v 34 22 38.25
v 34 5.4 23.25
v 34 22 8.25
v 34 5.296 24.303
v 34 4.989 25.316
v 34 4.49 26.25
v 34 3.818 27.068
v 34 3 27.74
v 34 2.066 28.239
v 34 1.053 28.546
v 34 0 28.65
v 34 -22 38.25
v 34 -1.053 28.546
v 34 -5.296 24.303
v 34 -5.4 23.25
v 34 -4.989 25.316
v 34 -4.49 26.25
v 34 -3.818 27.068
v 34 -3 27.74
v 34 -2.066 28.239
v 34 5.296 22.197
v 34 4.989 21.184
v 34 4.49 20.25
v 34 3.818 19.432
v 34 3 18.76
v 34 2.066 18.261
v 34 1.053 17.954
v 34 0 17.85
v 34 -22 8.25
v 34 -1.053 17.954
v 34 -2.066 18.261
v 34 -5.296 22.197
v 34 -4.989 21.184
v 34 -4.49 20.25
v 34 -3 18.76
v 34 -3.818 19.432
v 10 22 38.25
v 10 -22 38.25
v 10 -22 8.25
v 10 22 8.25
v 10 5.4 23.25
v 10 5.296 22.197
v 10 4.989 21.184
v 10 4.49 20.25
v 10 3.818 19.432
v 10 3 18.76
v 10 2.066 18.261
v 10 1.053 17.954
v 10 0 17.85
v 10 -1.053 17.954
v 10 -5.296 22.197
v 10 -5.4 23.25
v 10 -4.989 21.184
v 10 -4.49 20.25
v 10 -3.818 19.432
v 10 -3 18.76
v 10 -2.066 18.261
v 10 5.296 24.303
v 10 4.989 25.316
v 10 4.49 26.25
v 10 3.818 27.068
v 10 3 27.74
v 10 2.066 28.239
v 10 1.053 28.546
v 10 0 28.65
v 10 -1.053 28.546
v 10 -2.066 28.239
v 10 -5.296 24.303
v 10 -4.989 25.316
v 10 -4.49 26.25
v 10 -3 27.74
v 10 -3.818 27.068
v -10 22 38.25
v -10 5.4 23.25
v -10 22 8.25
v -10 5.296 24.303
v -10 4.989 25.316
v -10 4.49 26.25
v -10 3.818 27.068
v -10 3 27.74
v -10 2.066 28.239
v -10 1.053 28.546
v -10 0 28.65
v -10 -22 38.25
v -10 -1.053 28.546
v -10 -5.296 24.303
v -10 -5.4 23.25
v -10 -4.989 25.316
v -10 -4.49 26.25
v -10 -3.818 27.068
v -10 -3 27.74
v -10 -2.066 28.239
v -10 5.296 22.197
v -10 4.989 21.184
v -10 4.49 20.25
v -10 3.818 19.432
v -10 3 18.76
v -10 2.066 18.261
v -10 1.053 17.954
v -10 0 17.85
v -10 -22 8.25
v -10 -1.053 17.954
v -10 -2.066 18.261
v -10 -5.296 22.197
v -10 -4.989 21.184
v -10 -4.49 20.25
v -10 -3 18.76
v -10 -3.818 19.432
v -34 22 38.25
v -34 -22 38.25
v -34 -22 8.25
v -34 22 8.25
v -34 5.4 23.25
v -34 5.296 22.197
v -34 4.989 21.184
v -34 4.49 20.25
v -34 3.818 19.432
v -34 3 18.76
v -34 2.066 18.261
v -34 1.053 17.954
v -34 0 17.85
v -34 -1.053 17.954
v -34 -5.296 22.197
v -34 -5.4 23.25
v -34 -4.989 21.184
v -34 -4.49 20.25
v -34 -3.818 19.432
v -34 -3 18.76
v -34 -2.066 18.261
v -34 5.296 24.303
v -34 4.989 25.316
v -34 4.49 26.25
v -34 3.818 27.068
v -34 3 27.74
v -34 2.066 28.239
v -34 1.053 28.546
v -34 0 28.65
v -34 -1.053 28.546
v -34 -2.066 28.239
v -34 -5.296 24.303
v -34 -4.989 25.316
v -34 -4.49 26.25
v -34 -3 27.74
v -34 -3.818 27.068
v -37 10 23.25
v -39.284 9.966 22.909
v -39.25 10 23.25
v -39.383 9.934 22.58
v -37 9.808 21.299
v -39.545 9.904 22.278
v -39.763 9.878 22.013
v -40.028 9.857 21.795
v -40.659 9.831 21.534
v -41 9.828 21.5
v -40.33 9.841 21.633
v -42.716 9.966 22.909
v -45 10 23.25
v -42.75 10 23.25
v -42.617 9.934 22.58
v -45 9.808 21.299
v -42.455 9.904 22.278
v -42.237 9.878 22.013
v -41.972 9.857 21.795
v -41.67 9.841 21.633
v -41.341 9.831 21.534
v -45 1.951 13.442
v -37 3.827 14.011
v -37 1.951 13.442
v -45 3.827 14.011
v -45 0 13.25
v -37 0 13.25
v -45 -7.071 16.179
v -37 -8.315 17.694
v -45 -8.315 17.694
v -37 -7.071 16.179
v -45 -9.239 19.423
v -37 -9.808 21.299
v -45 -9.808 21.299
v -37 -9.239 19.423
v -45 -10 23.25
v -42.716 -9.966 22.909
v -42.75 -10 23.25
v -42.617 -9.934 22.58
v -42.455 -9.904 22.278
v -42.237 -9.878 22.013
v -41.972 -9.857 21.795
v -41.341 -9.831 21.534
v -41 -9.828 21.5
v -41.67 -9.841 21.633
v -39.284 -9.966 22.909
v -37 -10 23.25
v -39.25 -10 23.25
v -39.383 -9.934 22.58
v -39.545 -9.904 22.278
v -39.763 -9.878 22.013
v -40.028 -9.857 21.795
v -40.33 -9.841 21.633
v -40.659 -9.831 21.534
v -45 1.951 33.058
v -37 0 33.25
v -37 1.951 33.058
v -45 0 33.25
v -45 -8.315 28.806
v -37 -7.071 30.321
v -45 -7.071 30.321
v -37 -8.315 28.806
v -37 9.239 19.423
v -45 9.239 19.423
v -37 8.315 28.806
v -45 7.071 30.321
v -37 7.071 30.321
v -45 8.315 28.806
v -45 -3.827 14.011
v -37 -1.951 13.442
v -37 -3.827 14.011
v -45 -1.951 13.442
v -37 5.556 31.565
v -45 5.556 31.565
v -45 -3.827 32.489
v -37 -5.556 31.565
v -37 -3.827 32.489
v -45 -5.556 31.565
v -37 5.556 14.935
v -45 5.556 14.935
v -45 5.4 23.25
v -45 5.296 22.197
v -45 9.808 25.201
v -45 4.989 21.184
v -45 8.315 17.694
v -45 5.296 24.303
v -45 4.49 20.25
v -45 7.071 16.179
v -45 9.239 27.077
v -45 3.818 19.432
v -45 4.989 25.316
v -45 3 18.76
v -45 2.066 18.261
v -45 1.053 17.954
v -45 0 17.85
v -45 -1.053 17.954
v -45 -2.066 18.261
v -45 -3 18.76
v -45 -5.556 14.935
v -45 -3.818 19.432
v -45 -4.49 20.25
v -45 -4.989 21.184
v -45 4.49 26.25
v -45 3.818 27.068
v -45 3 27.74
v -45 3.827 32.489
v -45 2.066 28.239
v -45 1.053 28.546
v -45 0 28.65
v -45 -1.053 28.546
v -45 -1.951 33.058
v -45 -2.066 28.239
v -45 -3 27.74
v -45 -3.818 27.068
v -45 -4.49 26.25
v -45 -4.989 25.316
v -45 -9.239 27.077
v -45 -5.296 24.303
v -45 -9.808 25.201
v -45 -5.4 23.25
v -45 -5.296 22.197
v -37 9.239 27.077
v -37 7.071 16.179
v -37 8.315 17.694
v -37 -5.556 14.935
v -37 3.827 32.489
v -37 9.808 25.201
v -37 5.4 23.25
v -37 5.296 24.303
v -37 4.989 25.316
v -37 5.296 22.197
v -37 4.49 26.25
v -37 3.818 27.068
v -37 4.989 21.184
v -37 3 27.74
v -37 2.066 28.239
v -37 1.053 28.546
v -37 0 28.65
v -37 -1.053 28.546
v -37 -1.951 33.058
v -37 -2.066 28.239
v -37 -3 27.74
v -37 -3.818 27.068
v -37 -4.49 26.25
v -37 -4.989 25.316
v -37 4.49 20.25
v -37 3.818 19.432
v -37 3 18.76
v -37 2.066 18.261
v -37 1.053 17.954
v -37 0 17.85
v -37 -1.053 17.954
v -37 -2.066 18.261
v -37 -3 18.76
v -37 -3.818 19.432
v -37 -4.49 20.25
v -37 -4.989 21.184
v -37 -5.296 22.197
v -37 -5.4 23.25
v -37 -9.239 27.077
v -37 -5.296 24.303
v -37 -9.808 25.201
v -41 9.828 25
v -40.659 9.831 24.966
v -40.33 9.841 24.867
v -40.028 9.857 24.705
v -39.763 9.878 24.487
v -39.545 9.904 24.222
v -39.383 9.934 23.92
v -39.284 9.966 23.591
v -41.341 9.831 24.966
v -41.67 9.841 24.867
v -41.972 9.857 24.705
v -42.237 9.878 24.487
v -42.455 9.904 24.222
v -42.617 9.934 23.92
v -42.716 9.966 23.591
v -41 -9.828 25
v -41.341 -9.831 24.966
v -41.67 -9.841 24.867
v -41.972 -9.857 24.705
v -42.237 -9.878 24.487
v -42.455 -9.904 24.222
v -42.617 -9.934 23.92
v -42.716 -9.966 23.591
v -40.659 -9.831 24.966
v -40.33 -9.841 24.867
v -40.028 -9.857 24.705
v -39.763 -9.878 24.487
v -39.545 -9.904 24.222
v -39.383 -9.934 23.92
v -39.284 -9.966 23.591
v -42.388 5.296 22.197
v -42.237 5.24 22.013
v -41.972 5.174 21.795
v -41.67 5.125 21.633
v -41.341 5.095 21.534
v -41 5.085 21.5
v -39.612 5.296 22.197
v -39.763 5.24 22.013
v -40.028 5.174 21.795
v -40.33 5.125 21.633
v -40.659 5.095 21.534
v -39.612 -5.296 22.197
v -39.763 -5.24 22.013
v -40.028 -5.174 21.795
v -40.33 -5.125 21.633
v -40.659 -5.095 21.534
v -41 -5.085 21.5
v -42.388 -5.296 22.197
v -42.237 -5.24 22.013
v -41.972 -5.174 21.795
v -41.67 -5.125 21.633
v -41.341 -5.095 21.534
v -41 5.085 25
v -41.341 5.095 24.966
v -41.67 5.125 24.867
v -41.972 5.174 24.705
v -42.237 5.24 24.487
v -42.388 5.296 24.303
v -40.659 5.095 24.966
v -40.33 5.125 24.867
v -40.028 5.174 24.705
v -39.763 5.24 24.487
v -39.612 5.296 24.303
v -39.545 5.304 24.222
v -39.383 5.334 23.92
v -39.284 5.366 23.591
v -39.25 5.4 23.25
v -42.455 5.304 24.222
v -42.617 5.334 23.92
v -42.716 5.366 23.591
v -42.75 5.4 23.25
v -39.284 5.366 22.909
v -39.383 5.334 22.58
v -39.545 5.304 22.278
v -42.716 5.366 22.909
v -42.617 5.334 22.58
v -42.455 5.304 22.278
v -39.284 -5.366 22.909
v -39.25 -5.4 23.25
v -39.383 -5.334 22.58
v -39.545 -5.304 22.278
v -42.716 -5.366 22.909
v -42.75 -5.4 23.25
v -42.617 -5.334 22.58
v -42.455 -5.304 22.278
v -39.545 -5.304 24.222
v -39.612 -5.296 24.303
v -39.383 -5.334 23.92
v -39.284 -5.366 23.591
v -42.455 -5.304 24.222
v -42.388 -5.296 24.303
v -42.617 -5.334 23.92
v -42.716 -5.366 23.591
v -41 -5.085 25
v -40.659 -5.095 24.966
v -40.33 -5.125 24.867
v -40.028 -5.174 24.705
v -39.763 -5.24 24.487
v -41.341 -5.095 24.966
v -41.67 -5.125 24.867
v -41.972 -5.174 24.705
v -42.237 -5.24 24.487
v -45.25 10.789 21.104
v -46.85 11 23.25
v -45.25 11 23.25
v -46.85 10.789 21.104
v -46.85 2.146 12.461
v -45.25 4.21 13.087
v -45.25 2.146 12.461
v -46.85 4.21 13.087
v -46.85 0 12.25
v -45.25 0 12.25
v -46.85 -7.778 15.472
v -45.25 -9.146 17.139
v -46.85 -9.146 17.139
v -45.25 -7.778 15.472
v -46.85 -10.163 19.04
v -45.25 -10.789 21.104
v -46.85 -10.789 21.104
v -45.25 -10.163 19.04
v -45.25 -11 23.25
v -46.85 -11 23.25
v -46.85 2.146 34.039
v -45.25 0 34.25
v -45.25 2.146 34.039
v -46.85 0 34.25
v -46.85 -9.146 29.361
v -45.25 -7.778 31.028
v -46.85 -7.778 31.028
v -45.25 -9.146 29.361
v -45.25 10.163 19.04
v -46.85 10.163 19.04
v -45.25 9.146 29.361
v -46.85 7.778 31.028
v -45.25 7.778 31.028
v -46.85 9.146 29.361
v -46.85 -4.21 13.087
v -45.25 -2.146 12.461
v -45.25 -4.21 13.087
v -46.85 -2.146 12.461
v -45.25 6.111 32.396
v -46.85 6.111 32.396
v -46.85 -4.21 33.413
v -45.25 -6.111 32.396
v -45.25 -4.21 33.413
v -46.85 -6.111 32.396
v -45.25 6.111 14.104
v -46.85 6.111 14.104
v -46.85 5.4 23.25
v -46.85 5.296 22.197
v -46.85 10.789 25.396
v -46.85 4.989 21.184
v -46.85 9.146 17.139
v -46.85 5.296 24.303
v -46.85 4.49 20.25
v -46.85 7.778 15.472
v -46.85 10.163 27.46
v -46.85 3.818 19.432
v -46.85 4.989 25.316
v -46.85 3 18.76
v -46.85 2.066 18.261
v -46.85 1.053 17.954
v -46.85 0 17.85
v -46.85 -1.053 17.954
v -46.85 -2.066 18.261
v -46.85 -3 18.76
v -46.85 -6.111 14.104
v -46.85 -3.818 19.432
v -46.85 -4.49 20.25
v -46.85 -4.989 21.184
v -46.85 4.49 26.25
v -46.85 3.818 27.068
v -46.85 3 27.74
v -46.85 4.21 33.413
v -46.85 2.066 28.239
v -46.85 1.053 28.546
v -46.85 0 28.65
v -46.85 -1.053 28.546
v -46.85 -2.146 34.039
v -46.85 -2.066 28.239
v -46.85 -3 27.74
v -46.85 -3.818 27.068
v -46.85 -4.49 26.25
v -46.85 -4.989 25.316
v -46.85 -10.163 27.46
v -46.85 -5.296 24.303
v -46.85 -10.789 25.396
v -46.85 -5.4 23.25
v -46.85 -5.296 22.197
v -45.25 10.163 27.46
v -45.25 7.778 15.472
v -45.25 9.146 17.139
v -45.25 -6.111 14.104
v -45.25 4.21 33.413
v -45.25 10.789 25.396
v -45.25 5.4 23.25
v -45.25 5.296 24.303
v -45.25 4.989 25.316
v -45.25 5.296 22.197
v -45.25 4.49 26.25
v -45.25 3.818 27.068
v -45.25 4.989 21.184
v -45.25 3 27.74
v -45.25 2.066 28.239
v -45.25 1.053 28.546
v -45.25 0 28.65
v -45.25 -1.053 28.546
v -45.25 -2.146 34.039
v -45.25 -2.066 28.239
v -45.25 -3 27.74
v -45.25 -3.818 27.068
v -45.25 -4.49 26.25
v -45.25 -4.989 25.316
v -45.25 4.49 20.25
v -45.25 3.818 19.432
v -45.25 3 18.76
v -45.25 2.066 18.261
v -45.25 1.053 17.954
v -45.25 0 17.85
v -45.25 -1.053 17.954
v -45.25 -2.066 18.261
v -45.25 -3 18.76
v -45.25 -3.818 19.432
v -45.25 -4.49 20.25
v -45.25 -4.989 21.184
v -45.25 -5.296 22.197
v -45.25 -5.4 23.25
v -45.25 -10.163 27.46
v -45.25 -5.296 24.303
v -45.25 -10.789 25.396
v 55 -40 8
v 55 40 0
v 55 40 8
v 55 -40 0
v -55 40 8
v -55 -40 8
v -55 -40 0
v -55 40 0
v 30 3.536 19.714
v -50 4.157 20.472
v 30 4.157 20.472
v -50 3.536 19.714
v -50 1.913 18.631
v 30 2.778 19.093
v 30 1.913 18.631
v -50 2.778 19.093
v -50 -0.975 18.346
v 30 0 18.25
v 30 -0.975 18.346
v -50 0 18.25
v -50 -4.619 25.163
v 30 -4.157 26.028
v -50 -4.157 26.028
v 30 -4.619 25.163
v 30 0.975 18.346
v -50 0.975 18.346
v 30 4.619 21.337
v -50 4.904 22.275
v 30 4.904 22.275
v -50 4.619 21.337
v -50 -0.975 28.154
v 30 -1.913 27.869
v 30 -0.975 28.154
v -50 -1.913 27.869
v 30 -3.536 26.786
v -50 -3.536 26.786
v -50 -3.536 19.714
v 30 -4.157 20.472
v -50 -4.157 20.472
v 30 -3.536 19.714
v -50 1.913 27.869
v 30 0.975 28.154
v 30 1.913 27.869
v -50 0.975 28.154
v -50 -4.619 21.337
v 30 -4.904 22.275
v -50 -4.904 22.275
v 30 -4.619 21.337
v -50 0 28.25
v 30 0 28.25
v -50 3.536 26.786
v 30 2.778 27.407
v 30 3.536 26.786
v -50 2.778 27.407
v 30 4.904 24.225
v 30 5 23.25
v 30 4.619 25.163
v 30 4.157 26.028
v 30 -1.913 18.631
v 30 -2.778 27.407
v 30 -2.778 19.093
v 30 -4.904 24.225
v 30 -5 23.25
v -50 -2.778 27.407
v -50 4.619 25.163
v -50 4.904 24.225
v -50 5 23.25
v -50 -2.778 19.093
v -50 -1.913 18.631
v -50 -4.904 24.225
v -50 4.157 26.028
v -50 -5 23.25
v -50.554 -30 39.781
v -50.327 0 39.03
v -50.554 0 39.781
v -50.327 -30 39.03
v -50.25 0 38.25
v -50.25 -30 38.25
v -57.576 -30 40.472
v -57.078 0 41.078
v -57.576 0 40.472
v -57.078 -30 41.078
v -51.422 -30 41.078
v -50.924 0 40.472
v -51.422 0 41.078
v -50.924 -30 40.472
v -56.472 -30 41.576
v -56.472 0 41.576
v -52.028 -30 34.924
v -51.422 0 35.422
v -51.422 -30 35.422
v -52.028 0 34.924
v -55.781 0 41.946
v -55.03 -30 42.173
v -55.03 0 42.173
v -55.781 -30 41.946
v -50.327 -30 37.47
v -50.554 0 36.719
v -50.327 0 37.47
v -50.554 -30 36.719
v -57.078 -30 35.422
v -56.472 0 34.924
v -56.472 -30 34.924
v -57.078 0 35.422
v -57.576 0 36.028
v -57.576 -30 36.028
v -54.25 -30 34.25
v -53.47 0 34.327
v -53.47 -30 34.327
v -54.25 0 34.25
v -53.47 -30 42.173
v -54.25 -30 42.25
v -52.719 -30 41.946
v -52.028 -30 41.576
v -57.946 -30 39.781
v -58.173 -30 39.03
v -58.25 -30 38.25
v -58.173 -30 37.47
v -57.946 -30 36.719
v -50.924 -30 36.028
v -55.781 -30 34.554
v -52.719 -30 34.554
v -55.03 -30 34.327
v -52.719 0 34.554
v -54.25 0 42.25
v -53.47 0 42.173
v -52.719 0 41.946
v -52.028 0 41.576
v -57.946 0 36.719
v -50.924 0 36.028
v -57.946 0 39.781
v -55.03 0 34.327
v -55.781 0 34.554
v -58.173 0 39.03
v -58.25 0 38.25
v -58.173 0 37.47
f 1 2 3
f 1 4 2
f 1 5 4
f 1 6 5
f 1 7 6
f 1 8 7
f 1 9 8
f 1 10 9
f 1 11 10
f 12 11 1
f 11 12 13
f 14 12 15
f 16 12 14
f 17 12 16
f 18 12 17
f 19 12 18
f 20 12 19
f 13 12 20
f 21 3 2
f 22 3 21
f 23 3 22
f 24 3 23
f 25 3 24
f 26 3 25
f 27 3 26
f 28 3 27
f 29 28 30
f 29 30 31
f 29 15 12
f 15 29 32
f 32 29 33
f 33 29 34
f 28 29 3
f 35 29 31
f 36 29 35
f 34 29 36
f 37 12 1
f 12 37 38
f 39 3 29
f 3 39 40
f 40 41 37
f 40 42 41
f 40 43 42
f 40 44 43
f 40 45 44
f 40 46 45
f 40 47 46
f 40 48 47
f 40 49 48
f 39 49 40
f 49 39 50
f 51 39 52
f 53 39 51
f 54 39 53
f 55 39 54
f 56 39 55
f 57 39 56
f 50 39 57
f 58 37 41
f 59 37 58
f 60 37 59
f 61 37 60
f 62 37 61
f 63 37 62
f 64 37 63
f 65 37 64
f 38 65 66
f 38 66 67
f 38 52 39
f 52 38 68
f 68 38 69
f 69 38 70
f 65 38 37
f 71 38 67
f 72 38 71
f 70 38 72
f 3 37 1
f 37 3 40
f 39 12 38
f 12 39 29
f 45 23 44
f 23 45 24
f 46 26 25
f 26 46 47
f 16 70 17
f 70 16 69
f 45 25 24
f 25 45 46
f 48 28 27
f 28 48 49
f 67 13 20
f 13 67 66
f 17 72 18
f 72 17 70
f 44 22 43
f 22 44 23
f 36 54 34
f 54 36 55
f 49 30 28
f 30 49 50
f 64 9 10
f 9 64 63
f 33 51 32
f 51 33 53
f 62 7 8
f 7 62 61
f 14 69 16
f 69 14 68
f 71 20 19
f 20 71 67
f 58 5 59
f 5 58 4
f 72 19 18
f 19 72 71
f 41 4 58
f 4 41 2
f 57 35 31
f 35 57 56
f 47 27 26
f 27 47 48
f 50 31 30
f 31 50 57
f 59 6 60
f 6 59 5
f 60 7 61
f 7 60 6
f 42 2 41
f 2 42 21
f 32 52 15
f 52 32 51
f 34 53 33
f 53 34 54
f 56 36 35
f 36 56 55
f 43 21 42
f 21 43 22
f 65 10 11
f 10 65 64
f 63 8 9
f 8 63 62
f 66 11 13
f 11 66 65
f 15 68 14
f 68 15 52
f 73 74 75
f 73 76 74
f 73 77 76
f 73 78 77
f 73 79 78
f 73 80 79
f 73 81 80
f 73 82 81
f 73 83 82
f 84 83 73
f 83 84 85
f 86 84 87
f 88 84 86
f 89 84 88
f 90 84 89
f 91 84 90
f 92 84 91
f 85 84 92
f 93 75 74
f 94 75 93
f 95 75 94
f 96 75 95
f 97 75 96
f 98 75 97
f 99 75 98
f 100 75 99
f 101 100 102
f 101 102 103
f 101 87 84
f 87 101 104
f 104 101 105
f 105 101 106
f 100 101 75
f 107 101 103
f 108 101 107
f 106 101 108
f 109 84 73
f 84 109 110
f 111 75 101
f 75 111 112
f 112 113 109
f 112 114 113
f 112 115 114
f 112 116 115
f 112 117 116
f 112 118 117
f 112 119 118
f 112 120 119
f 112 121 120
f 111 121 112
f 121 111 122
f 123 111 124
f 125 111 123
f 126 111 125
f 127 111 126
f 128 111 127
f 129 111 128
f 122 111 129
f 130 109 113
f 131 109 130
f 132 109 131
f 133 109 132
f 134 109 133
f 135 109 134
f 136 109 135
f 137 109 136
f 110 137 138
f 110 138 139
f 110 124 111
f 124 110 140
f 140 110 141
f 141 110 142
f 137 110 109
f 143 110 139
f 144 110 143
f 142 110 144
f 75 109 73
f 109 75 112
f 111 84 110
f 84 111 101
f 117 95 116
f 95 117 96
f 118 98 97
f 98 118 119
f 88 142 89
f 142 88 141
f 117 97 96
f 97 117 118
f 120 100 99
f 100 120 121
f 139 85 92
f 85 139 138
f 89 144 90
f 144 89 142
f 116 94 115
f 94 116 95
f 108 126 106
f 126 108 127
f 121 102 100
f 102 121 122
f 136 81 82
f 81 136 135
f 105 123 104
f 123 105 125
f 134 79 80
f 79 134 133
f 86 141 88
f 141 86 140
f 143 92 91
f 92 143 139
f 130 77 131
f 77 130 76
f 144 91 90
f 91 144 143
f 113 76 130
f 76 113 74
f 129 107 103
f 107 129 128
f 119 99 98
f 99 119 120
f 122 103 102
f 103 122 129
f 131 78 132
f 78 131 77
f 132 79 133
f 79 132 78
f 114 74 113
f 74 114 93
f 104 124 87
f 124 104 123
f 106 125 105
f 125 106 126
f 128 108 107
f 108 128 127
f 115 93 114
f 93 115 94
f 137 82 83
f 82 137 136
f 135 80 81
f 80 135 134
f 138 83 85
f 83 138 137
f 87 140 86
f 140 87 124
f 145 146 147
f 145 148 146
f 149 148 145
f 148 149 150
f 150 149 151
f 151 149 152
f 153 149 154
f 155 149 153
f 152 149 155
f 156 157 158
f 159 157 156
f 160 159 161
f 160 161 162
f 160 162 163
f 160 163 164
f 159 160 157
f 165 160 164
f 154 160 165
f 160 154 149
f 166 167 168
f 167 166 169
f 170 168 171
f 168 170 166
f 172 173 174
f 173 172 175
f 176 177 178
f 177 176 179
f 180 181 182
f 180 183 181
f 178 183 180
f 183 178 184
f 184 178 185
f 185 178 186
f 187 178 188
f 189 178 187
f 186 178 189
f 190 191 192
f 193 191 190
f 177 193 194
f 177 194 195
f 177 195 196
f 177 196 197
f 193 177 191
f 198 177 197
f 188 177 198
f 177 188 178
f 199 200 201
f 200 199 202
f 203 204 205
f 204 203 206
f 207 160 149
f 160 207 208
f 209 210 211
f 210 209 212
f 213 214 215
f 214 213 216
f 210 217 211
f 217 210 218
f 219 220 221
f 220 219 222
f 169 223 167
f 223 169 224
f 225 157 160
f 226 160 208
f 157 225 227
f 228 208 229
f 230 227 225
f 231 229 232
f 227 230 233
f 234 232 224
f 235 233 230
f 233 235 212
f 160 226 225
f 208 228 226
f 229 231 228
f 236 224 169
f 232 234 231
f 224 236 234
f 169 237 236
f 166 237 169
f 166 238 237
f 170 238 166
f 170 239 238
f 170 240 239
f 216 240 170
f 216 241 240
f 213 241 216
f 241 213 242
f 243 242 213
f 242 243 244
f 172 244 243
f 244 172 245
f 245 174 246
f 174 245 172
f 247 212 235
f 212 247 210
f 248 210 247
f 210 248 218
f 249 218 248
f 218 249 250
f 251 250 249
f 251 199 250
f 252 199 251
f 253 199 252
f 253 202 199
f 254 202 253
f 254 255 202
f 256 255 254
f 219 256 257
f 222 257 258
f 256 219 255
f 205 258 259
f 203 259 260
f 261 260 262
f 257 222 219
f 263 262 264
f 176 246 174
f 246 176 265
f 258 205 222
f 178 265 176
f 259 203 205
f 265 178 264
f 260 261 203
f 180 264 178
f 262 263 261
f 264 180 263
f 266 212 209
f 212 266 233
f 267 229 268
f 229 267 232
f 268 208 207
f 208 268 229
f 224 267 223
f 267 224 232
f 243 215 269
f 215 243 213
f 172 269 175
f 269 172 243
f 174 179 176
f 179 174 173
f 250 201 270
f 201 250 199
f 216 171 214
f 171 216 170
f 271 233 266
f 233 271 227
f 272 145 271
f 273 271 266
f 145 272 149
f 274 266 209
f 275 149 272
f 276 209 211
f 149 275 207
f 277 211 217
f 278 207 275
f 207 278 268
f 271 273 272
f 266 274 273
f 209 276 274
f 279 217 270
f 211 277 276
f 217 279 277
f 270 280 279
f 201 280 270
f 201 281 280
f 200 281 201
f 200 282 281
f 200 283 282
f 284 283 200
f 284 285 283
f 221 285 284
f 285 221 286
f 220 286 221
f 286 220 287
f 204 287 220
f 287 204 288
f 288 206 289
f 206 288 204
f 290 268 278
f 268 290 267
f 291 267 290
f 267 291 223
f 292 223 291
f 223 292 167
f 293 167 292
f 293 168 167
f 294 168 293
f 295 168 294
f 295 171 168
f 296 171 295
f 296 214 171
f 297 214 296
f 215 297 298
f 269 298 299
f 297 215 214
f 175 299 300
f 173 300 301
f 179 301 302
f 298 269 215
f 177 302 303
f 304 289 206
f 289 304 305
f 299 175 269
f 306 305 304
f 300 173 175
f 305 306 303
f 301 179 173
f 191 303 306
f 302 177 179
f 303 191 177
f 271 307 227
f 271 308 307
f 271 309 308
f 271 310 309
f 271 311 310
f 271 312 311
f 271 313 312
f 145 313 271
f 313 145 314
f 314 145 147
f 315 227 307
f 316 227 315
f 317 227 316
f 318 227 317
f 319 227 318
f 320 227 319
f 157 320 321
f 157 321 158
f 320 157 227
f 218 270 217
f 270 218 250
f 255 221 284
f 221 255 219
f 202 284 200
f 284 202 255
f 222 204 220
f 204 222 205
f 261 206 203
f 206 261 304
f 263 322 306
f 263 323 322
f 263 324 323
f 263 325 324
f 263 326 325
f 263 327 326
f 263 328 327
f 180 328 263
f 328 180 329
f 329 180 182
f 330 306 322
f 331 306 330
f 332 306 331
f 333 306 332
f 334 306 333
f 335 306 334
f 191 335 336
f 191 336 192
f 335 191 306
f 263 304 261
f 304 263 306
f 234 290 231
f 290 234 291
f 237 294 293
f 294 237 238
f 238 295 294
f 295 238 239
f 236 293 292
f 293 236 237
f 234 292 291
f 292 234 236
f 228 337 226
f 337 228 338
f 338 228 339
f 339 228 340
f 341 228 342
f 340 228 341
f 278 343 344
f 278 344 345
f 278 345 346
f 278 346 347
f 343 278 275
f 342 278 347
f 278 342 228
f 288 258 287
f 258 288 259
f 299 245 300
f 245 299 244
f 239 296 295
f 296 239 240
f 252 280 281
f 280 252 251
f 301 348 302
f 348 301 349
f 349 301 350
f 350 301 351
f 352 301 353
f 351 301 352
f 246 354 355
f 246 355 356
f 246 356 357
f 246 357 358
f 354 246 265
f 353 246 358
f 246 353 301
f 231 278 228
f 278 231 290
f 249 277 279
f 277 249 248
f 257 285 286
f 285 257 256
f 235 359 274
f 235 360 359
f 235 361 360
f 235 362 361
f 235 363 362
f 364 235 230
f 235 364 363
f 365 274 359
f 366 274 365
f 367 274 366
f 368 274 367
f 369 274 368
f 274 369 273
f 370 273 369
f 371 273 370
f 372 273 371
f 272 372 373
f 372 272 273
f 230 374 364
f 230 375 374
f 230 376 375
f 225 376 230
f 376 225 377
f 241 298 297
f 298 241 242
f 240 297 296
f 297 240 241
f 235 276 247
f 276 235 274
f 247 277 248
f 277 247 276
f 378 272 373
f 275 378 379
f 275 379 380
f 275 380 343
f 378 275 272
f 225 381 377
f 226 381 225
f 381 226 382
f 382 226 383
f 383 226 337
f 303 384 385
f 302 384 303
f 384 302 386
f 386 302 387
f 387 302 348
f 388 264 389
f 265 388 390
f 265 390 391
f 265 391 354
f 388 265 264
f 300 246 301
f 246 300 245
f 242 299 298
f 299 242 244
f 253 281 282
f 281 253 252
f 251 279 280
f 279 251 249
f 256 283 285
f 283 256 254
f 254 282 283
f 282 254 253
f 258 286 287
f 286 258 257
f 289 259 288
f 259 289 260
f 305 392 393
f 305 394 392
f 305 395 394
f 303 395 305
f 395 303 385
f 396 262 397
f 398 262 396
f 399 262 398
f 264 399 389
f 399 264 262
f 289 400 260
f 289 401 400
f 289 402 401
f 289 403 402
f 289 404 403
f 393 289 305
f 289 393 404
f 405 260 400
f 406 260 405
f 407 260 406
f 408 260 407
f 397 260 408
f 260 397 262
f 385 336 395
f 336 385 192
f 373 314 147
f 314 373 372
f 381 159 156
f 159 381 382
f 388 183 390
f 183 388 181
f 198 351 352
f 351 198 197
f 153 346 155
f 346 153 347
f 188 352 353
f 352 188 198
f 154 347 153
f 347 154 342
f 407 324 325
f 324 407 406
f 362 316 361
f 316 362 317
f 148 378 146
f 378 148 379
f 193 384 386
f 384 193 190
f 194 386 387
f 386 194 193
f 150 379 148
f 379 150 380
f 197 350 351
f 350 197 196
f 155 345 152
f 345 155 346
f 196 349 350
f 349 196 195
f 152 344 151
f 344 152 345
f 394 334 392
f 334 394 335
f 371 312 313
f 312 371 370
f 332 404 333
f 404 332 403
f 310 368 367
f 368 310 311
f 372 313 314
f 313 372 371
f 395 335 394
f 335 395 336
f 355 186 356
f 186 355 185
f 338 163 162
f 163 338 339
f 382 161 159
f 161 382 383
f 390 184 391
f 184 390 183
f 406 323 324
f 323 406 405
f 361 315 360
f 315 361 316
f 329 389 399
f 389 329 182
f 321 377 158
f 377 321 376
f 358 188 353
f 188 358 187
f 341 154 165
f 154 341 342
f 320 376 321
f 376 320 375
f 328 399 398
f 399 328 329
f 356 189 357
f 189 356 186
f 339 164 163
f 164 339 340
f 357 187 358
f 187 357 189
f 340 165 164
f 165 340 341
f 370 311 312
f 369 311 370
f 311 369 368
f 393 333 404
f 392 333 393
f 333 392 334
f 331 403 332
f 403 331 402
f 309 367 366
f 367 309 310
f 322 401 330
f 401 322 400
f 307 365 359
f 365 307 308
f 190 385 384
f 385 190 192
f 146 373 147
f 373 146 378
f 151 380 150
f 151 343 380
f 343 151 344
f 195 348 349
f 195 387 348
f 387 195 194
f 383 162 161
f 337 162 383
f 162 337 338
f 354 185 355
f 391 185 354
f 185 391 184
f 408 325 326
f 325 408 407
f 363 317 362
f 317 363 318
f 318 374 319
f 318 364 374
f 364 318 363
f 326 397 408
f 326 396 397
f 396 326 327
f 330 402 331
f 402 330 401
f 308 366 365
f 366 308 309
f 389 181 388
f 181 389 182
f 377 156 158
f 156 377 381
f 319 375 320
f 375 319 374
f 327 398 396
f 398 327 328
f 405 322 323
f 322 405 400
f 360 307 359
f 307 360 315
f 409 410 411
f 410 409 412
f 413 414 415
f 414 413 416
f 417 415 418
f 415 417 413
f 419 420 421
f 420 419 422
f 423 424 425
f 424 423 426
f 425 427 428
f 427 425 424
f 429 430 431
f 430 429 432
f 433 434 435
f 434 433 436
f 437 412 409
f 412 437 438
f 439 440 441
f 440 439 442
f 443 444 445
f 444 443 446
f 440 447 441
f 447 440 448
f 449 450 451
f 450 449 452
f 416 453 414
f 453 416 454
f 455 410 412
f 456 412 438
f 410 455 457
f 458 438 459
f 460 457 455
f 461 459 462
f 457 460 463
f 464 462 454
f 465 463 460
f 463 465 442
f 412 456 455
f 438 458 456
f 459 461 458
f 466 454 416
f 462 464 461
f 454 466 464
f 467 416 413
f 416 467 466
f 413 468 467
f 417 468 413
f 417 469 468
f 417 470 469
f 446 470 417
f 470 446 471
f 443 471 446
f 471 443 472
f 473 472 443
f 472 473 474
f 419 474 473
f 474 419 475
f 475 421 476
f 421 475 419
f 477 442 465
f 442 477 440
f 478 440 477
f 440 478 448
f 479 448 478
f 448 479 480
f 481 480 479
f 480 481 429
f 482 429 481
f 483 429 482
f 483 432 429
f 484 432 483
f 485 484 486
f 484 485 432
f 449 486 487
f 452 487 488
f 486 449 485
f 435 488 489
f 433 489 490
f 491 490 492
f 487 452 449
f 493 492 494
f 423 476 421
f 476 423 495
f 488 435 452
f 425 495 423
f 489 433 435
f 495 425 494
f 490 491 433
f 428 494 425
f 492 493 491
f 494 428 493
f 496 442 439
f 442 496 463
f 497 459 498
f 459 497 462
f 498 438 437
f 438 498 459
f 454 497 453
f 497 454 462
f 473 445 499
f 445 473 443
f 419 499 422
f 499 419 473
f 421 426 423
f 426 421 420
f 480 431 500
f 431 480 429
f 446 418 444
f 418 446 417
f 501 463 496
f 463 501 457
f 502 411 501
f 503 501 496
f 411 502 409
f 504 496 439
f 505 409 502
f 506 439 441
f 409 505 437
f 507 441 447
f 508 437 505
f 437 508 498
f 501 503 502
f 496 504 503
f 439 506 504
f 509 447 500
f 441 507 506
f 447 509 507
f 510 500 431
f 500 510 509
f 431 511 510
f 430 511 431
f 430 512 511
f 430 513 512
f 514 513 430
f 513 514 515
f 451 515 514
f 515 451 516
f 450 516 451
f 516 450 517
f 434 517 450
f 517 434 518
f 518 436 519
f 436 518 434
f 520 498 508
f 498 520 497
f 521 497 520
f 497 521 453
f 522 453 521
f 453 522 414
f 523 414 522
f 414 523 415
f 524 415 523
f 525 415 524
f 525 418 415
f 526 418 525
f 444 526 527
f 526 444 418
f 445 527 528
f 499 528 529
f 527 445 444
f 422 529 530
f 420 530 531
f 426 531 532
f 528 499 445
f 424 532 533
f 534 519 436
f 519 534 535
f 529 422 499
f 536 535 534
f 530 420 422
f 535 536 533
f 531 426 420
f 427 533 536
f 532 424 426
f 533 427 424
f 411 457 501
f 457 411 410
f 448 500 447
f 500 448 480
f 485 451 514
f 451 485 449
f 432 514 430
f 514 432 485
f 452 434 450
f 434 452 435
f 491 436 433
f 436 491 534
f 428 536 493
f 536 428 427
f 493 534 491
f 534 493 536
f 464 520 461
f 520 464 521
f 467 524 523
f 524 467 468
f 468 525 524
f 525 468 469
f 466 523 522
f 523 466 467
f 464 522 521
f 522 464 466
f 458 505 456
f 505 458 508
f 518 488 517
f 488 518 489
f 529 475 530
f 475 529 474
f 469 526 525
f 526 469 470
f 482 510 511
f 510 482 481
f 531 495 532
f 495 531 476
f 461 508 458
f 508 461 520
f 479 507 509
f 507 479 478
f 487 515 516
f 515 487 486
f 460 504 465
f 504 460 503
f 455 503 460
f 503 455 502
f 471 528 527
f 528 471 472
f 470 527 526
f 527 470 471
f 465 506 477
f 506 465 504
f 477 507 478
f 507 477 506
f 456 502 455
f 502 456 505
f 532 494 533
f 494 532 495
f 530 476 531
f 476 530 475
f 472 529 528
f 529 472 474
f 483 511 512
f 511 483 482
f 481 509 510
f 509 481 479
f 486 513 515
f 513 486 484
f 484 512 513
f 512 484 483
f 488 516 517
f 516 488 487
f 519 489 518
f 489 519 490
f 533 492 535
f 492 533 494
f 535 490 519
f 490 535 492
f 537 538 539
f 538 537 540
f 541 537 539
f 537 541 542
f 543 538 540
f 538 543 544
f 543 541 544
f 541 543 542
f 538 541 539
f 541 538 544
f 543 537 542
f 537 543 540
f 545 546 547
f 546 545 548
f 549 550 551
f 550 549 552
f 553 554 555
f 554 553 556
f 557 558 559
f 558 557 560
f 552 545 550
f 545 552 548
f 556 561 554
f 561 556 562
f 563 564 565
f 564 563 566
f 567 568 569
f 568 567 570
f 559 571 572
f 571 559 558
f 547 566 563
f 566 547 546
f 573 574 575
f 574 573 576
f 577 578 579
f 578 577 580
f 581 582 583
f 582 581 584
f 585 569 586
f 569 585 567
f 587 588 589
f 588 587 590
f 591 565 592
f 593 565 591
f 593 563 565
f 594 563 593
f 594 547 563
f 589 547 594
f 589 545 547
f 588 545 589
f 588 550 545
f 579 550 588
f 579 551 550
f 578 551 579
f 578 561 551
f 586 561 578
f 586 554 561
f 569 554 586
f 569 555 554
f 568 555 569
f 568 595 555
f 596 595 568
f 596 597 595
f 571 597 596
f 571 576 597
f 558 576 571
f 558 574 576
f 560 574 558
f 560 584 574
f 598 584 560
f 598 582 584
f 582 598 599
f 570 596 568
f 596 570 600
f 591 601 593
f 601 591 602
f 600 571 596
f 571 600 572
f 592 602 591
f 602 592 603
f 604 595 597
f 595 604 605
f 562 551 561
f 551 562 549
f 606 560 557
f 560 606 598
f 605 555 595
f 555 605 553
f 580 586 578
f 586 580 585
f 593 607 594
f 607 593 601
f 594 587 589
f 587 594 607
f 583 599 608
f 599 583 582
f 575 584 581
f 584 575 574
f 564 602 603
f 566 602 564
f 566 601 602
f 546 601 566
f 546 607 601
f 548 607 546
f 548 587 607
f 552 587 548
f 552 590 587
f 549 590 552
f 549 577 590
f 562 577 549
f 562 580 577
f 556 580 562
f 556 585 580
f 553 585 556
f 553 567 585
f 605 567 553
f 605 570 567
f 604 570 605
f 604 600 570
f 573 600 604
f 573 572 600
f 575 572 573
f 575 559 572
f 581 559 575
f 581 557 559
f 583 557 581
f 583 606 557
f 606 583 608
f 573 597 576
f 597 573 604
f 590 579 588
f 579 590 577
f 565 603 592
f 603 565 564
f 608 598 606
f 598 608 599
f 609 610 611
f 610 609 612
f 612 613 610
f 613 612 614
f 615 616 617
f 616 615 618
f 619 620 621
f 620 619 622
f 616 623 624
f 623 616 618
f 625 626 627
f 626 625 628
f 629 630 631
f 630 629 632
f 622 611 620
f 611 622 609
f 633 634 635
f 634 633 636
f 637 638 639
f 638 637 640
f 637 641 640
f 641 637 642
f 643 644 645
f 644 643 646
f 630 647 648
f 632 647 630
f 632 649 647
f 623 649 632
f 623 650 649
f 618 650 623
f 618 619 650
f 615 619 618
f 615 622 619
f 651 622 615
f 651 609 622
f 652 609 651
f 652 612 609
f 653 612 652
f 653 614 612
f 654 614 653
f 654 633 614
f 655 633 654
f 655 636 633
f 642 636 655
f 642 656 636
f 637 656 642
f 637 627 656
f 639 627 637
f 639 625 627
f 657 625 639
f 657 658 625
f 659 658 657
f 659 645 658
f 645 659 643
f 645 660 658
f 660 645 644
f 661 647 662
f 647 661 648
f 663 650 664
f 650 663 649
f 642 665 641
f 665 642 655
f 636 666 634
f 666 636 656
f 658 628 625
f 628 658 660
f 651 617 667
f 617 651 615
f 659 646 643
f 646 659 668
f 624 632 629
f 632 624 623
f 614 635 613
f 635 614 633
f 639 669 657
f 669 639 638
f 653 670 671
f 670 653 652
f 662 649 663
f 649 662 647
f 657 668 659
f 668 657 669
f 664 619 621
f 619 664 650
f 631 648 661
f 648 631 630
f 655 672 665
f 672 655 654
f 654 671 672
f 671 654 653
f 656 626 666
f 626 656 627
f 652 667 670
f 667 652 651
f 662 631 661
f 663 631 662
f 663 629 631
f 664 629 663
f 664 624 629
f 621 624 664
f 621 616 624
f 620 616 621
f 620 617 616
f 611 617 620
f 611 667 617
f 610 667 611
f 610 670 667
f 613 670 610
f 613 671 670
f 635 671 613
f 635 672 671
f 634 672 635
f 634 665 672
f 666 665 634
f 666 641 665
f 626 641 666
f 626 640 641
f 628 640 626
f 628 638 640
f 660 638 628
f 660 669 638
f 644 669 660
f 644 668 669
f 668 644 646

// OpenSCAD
$fn = 32;

// ------------------------------------------------------------------------
// Machine vise: screw d10, jaws 24 x 30 mm
// Every part is its own module, assembly() places every instance.
// ------------------------------------------------------------------------

// --- part 1 ---
module vise_bed() {
  difference() {
    translate([-55, -40, 0]) cube([110, 80, 8]);
  }
}

// --- part 2 ---
module vise_jaw() {
  difference() {
    translate([-12, -22, 0]) cube([24, 44, 30]);
    translate([0, 0, 15]) rotate([0, 90, 0]) cylinder(h = 26, d = 10.8, center = true);
  }
}

// --- part 3 ---
module vise_screw() {
  translate([0, 0, -40]) cylinder(h = 80, d = 10);
}

// --- part 4 ---
module screw_collar() {
  difference() {
    cylinder(h = 8, d = 20);
    translate([0, 0, -1]) cylinder(h = 10, d = 10.8);
    translate([0, 0, 4]) rotate([90, 0, 0]) cylinder(h = 22, d = 3.5, center = true);
  }
}

// --- part 5 ---
module screw_washer() {
  difference() {
      translate([0, 0, 0]) cylinder(h = 1.6, d = 22);
      translate([0, 0, -1]) cylinder(h = 3.6, d = 10.8);
    }
}

// --- part 6 ---
module vise_handle() {
  cylinder(h = 30, d = 8);
}

// --- assembly ---
module assembly() {
  color([0.80, 0.24, 0.20]) translate([0, 0, 0]) rotate([0, 0, 0]) vise_bed();
  color([0.20, 0.45, 0.75]) translate([22, 0, 8.25]) rotate([0, 0, 0]) vise_jaw();
  color([0.25, 0.62, 0.32]) translate([-22, 0, 8.25]) rotate([0, 0, 0]) vise_jaw();
  color([0.92, 0.70, 0.18]) translate([-10, 0, 23.25]) rotate([0, 90, 0]) vise_screw();
  color([0.58, 0.35, 0.70]) translate([-45, 0, 23.25]) rotate([0, 90, 0]) screw_collar();
  color([0.16, 0.66, 0.66]) translate([-46.85, 0, 23.25]) rotate([0, 90, 0]) screw_washer();
  color([0.85, 0.48, 0.18]) translate([-54.25, 0, 38.25]) rotate([90, 0, 0]) vise_handle();
}

assembly();
